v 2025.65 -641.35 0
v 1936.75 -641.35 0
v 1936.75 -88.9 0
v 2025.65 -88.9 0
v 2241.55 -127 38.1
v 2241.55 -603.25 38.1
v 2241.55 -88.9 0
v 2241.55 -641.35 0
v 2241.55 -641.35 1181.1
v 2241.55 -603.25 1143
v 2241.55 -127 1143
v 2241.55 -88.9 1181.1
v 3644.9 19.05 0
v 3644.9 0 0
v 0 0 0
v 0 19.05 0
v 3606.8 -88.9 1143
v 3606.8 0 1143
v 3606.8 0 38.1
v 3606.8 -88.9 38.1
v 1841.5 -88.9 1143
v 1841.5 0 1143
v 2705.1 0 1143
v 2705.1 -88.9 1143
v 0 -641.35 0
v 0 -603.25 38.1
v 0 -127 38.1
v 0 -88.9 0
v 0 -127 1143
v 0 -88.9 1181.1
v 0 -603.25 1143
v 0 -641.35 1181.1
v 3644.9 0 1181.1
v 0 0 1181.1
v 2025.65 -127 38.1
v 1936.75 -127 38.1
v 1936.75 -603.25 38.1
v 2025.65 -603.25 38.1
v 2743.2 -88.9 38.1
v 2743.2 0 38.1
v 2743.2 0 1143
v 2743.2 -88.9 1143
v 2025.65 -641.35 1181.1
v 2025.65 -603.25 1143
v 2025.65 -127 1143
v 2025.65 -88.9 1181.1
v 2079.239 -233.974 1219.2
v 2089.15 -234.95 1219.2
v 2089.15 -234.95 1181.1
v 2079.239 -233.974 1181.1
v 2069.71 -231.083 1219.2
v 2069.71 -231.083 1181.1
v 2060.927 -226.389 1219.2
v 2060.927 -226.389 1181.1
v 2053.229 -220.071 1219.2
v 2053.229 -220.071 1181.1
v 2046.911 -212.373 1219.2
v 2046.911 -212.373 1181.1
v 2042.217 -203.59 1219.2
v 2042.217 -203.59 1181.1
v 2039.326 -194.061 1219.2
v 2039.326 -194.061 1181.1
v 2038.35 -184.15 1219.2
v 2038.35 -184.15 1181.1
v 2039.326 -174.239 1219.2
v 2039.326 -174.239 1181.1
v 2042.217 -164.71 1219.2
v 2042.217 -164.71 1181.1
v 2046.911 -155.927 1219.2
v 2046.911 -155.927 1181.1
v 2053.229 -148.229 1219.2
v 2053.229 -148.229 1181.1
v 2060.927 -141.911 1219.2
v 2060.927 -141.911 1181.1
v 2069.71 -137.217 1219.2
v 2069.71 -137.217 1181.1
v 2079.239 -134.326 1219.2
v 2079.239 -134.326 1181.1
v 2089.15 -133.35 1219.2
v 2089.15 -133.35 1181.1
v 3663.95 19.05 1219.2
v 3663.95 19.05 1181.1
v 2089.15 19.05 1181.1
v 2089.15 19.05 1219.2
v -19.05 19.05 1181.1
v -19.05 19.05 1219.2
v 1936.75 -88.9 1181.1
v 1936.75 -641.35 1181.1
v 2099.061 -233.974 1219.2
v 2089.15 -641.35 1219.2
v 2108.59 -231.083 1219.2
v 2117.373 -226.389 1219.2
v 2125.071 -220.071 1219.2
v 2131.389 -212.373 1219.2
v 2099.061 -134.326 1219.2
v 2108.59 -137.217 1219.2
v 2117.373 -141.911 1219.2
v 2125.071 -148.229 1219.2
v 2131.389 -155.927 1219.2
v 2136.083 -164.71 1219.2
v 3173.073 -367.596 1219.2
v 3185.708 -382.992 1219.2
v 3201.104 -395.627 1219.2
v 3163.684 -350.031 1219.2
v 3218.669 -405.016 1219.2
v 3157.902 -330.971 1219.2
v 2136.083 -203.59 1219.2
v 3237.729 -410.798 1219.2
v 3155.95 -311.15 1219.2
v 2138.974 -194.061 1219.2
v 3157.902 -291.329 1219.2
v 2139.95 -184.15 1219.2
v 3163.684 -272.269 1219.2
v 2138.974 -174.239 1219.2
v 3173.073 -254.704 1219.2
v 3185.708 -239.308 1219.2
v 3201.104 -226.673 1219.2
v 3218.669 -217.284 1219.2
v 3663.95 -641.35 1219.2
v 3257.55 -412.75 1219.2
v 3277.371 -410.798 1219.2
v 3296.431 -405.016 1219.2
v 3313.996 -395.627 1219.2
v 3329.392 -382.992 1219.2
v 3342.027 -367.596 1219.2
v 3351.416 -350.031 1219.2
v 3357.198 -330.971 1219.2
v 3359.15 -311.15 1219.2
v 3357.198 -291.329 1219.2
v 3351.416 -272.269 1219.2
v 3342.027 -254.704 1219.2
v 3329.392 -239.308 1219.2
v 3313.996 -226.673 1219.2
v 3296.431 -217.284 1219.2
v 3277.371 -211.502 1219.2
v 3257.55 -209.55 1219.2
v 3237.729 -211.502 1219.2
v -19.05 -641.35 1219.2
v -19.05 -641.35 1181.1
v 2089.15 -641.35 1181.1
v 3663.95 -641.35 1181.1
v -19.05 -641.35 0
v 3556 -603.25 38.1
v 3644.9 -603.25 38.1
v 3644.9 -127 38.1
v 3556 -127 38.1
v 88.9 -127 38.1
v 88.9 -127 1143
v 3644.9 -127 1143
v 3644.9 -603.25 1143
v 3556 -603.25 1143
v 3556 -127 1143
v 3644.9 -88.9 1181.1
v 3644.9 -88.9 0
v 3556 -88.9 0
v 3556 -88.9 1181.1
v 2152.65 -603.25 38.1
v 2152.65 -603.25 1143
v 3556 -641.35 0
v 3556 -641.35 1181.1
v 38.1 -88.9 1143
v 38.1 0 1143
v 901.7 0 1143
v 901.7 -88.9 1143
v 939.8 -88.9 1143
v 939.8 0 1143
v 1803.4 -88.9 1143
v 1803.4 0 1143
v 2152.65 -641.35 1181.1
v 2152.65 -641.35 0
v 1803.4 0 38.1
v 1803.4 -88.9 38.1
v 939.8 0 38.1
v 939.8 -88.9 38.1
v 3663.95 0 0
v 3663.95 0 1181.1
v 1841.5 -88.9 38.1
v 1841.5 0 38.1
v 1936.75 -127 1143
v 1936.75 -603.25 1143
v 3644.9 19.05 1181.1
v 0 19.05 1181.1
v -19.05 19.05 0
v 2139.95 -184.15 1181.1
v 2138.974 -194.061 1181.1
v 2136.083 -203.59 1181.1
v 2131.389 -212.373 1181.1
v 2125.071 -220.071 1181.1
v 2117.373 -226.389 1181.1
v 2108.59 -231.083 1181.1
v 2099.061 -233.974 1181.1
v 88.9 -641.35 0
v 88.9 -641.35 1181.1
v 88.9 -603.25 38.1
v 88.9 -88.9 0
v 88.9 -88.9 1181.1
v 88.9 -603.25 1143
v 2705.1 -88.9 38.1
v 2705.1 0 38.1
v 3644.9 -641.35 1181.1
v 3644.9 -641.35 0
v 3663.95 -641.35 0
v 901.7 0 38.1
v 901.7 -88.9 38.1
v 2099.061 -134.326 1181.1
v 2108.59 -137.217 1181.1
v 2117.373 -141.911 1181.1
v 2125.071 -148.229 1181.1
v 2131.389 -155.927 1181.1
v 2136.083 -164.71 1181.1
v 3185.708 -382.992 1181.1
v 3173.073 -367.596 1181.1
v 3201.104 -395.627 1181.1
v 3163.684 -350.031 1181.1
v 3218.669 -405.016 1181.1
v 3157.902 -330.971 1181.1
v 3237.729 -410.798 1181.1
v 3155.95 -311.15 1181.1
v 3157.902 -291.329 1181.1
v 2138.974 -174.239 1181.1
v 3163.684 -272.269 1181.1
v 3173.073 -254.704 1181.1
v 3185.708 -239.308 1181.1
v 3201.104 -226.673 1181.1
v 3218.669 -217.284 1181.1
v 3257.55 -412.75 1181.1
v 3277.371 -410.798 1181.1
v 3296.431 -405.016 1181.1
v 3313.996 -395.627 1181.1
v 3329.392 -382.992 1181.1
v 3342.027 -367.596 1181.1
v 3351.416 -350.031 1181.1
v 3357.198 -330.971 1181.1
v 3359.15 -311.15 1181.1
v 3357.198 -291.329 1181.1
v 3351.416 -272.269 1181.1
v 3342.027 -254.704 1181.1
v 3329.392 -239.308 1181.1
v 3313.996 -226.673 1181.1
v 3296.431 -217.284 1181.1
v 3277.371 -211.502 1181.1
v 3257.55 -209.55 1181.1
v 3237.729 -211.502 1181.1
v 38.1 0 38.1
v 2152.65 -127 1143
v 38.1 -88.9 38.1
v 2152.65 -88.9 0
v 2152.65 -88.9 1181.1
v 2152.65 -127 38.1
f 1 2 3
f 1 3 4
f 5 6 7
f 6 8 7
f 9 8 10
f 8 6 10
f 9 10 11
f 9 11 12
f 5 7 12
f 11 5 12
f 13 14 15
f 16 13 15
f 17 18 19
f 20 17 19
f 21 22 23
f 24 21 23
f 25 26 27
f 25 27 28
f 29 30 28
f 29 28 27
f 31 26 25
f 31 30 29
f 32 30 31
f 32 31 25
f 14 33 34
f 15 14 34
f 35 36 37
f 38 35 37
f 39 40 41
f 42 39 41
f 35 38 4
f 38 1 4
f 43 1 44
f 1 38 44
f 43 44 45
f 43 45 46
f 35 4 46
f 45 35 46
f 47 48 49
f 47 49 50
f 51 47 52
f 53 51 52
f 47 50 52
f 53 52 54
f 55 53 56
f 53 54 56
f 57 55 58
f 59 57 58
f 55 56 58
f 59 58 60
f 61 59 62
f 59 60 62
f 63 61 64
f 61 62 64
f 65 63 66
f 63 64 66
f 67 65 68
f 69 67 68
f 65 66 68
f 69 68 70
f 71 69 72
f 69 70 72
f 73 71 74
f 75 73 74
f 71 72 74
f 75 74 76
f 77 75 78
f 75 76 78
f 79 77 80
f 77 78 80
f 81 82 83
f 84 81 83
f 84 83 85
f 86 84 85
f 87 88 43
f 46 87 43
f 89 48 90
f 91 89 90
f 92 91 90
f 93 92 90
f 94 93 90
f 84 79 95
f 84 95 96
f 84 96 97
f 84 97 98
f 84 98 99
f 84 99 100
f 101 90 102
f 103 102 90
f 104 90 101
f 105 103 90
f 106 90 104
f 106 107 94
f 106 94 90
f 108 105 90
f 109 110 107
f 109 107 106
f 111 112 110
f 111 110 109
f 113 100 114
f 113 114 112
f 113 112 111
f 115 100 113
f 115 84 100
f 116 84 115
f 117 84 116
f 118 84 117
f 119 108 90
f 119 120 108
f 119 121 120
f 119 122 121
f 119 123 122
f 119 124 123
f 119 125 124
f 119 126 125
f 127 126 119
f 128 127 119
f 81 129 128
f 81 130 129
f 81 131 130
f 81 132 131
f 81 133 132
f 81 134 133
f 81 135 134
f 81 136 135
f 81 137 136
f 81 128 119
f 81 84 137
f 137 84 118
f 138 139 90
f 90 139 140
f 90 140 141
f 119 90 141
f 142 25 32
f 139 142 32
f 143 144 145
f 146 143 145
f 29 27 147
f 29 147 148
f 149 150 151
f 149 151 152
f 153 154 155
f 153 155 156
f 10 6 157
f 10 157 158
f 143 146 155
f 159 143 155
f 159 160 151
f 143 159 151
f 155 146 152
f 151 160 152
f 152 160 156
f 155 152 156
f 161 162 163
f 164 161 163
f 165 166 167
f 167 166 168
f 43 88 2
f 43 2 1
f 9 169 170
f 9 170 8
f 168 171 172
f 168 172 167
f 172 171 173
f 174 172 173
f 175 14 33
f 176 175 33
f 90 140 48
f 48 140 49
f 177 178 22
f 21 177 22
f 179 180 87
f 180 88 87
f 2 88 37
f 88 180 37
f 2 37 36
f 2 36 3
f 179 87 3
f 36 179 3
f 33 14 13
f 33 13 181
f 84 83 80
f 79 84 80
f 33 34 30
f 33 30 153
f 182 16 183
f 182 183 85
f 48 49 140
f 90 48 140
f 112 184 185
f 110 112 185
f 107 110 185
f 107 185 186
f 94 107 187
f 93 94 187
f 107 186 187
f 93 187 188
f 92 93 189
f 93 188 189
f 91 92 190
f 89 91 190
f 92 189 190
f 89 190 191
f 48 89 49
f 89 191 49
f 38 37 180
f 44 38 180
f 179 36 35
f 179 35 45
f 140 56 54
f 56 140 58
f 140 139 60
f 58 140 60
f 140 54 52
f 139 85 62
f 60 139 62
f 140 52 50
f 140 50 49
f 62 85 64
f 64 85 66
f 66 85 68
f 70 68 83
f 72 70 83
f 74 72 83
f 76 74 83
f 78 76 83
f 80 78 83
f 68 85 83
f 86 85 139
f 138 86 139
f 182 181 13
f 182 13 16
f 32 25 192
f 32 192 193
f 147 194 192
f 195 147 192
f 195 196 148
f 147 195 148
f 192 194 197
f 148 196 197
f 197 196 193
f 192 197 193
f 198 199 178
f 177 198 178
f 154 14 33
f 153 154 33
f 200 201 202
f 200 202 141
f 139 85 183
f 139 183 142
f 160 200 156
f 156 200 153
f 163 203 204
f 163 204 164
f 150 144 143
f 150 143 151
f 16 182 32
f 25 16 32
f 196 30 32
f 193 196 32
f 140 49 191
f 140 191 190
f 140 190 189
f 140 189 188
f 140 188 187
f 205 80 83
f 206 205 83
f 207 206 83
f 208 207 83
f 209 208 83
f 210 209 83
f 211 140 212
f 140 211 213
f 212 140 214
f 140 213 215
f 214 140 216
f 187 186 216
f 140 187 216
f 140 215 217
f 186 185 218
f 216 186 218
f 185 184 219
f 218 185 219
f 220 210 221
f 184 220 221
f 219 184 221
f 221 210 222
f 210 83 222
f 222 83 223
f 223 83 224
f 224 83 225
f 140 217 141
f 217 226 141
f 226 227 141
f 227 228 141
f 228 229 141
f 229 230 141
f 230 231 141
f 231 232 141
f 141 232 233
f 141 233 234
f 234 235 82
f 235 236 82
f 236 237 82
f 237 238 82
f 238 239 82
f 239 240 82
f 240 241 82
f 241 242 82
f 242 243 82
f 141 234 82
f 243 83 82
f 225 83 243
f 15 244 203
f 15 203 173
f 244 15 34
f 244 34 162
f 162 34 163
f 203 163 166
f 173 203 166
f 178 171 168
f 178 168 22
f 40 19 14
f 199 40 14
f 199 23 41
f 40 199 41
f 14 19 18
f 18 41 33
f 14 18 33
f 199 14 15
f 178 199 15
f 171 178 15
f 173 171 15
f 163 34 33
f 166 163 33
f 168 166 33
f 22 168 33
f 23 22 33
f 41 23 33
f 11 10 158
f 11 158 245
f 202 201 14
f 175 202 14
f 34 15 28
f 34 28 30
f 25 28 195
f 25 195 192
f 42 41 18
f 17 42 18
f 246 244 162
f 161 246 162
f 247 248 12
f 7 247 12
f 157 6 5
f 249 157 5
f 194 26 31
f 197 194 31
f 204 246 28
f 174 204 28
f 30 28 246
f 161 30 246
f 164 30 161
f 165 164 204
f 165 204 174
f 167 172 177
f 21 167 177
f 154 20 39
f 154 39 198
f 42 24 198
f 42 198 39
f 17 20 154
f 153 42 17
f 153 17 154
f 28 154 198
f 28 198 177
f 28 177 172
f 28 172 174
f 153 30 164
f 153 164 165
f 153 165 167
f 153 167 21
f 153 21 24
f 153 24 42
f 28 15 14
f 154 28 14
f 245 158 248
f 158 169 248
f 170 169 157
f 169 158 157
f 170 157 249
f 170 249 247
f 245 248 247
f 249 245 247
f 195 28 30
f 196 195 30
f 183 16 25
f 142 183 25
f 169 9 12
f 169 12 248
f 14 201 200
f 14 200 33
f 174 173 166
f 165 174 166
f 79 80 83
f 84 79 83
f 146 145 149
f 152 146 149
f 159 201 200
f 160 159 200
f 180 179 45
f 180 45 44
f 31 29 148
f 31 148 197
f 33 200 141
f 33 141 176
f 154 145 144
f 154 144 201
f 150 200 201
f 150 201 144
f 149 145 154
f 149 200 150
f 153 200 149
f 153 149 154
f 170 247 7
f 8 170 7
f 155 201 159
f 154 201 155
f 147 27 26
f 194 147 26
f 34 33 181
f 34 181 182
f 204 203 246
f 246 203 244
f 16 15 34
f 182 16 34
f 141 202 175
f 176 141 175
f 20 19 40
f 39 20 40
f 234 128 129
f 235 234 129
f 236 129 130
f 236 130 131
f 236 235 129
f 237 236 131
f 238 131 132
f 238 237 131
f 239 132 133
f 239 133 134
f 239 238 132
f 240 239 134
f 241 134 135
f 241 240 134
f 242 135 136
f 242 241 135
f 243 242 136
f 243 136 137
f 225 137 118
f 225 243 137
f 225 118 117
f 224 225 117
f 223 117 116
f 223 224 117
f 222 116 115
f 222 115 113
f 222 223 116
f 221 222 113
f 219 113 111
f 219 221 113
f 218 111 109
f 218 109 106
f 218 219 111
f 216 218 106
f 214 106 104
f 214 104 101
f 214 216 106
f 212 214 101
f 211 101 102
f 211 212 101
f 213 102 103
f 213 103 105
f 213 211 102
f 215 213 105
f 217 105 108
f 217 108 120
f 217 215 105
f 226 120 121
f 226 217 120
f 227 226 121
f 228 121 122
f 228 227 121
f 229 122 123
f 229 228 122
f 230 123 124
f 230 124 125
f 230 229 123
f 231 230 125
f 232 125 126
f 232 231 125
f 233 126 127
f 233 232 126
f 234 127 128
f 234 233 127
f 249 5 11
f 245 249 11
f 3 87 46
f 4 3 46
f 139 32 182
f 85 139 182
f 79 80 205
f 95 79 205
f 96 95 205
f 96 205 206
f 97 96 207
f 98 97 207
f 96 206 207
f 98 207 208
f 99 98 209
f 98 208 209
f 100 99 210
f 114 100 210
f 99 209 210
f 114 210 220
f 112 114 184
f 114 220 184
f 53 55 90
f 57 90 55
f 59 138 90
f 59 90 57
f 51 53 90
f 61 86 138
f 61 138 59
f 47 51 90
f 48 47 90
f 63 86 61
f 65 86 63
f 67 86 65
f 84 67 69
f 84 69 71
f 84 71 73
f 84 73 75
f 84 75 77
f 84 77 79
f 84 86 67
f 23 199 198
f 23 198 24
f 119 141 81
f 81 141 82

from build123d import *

# Parameters (mm, degrees)
F0_W      = 3644.9
F0_H      = 1181.1
F0_W_2    = 38.1
F0_H_2    = 1104.9
F1_DEPTH  = 88.9
F2_W      = 3644.9
F2_H      = 1181.1
F3_DEPTH  = 19.05
F4_W      = 2089.15
F4_H      = 19.05
F5_DEPTH  = 38.1
F4_R      = 101.6
F4_W_2    = 1555.75
F6_DEPTH  = 38.1
F7_W      = 552.45
F7_H      = 1181.1
F7_W_2    = 476.25
F7_H_2    = 1104.9
F8_DEPTH  = 88.9
F9_W      = 552.45
F9_H      = 1181.1
F9_W_2    = 476.25
F9_H_2    = 1104.9
F10_DEPTH = 88.9
F11_W     = 641.35
F11_H     = 1181.1
F12_DEPTH = 19.05
F13_W     = 19.05
F13_H     = 1181.1
F13_W_2   = 641.35
F14_DEPTH = 19.05
F15_W     = 88.9
F15_H     = 1104.9
F15_H_2   = 38.1
F16_DEPTH = 552.45
F17_W     = 476.25
F17_H     = 1104.9
F18_DEPTH = 88.9
F19_W     = 88.9
F19_H     = 1104.9
F19_H_2   = 38.1
F20_DEPTH = 552.45
F21_W     = 476.25
F21_H     = 1104.9
F22_DEPTH = 88.9


# Not quite as in the source:
# - a feature names something its author has since deleted; it is built from what else it names


with BuildPart() as f1:
    # F0 (on Front) → F1 (new body)
    with BuildSketch(Plane.XZ):
        with Locations((1822.45, 590.55)):
            Rectangle(F0_W, F0_H)
        Polygon((38.1, 38.1), (38.1, 1143), (901.7, 1143), (939.8, 1143), (1803.4, 1143), (1841.5, 1143), (2705.1, 1143), (2743.2, 1143), (3606.8, 1143), (3606.8, 38.1), (2743.2, 38.1), (2705.1, 38.1), (1841.5, 38.1), (1803.4, 38.1), (939.8, 38.1), (901.7, 38.1), align=None, mode=Mode.SUBTRACT)
        with Locations((920.75, 590.55)):
            Rectangle(F0_W_2, F0_H_2)
        with Locations((1822.45, 590.55)):
            Rectangle(F0_W_2, F0_H_2)
        with Locations((2724.15, 590.55)):
            Rectangle(F0_W_2, F0_H_2)
    extrude(amount=F1_DEPTH)


with BuildPart() as f3:
    # F2 (on face) → F3 (new body)
    with BuildSketch(Plane(origin=(0, 0, 0), x_dir=(-1, 0, 0), z_dir=(0, 1, 0))):
        with Locations((-1822.45, 590.55)):
            Rectangle(F2_W, F2_H)
    extrude(amount=F3_DEPTH)


with BuildPart() as f5:
    # F4 (on face) → F5 (new body)
    with BuildSketch(Plane.XY.offset(1181.1)):
        with Locations((1044.575, 9.525)):
            Rectangle(F4_W, F4_H)
        with BuildLine():
            ThreePointArc((2089.15, -234.95), (2038.35, -184.15), (2089.15, -133.35))
            Line((2089.15, -133.35), (2089.15, 0))
            Line((2089.15, 0), (0, 0))
            Line((0, 0), (0, 19.05))
            Line((0, 19.05), (-19.05, 19.05))
            Line((-19.05, 19.05), (-19.05, -641.35))
            Line((-19.05, -641.35), (2089.15, -641.35))
            Line((2089.15, -641.35), (2089.15, -234.95))
        make_face()
    extrude(amount=F5_DEPTH)


with BuildPart() as f6:
    # F4 (on face) → F6 (new body)
    with BuildSketch(Plane.XY.offset(1181.1)):
        with BuildLine():
            ThreePointArc((2089.15, -133.35), (2125.0710244843, -148.2289755157), (2139.95, -184.15))
            ThreePointArc((2139.95, -184.15), (2125.0710244843, -220.0710244843), (2089.15, -234.95))
            Line((2089.15, -234.95), (2089.15, -641.35))
            Line((2089.15, -641.35), (3663.95, -641.35))
            Line((3663.95, -641.35), (3663.95, 19.05))
            Line((3663.95, 19.05), (3644.9, 19.05))
            Line((3644.9, 19.05), (3644.9, 0))
            Line((3644.9, 0), (2089.15, 0))
            Line((2089.15, 0), (2089.15, -133.35))
        make_face()
        with Locations((3257.55, -311.15)):
            Circle(F4_R, mode=Mode.SUBTRACT)
        with Locations((2867.025, 9.525)):
            Rectangle(F4_W_2, F4_H)
    extrude(amount=F6_DEPTH)


with BuildPart() as f8:
    # F7 (on face) → F8 (new body)
    with BuildSketch(Plane(origin=(0, 0, 0), x_dir=(0, -1, 0), z_dir=(-1, 0, 0))):
        with Locations((365.125, 590.55)):
            Rectangle(F7_W, F7_H)
        with Locations((365.125, 590.55)):
            Rectangle(F7_W_2, F7_H_2, mode=Mode.SUBTRACT)
    extrude(amount=-F8_DEPTH)


with BuildPart() as f10:
    # F9 (on face) → F10 (new body)
    with BuildSketch(Plane.YZ.offset(3644.9)):
        with Locations((-365.125, 590.55)):
            Rectangle(F9_W, F9_H)
        with Locations((-365.125, 590.55)):
            Rectangle(F9_W_2, F9_H_2, mode=Mode.SUBTRACT)
    extrude(amount=-F10_DEPTH)


with BuildPart() as f12:
    # F11 (on face) → F12 (new body)
    with BuildSketch(Plane.YZ.offset(3644.9)):
        with Locations((-320.675, 590.55)):
            Rectangle(F11_W, F11_H)
    extrude(amount=F12_DEPTH)


with BuildPart() as f14:
    # F13 (on face) → F14 (new body)
    with BuildSketch(Plane(origin=(0, 0, 0), x_dir=(0, -1, 0), z_dir=(-1, 0, 0))):
        with Locations((-9.525, 590.55)):
            Rectangle(F13_W, F13_H)
        with Locations((320.675, 590.55)):
            Rectangle(F13_W_2, F13_H)
    extrude(amount=F14_DEPTH)


with BuildPart() as f16:
    # F15 (on face) → F16 (new body)
    with BuildSketch(Plane.XZ.offset(88.9)):
        Polygon((2152.65, 1181.1), (2152.65, 1143), (2241.55, 1143), (2241.55, 1181.1), (2216.15, 1181.1), align=None)
        with Locations((2197.1, 590.55)):
            Rectangle(F15_W, F15_H)
        with Locations((2197.1, 19.05)):
            Rectangle(F15_W, F15_H_2)
    extrude(amount=F16_DEPTH)

    # F17 (on face) → F18 (cut, through all)
    with BuildSketch(Plane.YZ.offset(2241.55)):
        with Locations((-365.125, 590.55)):
            Rectangle(F17_W, F17_H)
    extrude(amount=-F18_DEPTH, mode=Mode.SUBTRACT)


with BuildPart() as f20:
    # F19 (on face) → F20 (new body)
    with BuildSketch(Plane.XZ.offset(88.9)):
        with Locations((1981.2, 590.55)):
            Rectangle(F19_W, F19_H)
        with Locations((1981.2, 1162.05)):
            Rectangle(F19_W, F19_H_2)
        with Locations((1981.2, 19.05)):
            Rectangle(F19_W, F19_H_2)
    extrude(amount=F20_DEPTH)

    # F21 (on face) → F22 (cut, through all)
    with BuildSketch(Plane(origin=(1936.75, 0, 0), x_dir=(0, -1, 0), z_dir=(-1, 0, 0))):
        with Locations((365.125, 590.55)):
            Rectangle(F21_W, F21_H)
    extrude(amount=-F22_DEPTH, mode=Mode.SUBTRACT)


solid = Compound([f1.part, f3.part, f5.part, f6.part, f8.part, f10.part, f12.part, f14.part, f16.part, f20.part])
